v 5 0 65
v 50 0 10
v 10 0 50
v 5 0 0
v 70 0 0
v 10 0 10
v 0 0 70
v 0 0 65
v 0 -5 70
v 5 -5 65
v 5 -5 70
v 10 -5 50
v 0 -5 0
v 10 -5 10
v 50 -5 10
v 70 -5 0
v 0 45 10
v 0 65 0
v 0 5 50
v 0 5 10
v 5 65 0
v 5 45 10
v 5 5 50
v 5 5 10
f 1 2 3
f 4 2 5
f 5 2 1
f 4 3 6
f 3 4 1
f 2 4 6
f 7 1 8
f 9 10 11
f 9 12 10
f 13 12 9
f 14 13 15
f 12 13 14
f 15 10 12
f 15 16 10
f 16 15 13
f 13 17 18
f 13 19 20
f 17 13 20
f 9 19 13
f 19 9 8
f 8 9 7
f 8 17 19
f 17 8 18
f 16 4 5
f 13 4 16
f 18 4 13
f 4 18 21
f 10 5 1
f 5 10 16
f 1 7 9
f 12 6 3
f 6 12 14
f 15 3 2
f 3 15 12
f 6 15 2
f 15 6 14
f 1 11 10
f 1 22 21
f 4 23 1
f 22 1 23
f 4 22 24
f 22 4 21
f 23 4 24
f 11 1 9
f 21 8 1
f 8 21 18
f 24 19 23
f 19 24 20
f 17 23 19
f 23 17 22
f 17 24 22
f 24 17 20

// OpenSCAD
module triangle() {
    rotate([90,0,0]) linear_extrude(height=5) {
        difference() {
            polygon(points=[[0,0],[0,70],[70,0]]);
            polygon(points=[[10,10],[10,50],[50,10]]);
        }
    }
}

union() {
    triangle();
    translate([0,-5,0]) rotate([0,0,90]) triangle();
}
